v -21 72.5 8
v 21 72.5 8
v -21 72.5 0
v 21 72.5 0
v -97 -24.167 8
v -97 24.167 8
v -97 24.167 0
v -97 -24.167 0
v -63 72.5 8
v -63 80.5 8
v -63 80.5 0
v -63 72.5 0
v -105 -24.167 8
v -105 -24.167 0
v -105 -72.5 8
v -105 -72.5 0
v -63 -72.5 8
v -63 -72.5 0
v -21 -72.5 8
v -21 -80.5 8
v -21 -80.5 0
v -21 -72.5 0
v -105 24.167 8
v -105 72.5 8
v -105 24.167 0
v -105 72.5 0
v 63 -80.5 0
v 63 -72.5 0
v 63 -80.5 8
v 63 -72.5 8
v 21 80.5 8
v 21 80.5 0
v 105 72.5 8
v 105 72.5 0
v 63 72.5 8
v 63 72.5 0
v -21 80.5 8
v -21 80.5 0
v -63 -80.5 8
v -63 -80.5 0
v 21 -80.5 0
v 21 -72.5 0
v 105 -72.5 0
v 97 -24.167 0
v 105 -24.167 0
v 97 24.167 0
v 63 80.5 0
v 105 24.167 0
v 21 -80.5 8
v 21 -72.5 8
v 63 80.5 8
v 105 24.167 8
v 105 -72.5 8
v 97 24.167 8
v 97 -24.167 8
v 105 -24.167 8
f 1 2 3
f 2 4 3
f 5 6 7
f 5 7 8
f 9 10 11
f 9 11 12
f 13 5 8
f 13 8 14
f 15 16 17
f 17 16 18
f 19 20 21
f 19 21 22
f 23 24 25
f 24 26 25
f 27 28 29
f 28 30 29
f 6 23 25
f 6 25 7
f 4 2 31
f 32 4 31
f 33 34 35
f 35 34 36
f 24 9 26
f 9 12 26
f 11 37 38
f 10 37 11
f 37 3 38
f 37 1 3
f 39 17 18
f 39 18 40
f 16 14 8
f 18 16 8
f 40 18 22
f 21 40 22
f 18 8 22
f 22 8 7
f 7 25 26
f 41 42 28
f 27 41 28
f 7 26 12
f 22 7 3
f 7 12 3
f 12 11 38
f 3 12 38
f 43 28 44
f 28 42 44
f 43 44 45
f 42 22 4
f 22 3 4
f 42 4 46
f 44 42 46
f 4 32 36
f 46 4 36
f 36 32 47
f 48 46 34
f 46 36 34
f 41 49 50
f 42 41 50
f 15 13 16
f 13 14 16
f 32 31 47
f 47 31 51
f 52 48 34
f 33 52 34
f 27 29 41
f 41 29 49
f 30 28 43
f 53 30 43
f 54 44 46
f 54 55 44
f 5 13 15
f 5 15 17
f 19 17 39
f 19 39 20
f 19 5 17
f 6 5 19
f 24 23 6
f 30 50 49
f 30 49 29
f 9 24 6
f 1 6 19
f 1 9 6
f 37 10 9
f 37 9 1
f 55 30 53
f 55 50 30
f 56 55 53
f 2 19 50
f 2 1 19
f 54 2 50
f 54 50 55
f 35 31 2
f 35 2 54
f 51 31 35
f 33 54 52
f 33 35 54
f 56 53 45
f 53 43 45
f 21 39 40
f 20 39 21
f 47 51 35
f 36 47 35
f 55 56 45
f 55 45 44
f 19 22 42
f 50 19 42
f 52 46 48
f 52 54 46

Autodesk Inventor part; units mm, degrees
ref_plane "YZ Plane" through (0, 0, 0) normal (1, 0, 0) x (0, 1, 0)
ref_plane "XZ Plane" through (0, 0, 0) normal (0, 1, 0) x (-1, 0, 0)
ref_plane "XY Plane" through (0, 0, 0) normal (0, 0, 1) x (1, 0, 0)
sketch "Sketch2" plane through (0, 0, 0) normal (0, 0, 1) x (1, 0, 0)
  line L0 (-105, -72.5) -> (105, -72.5)
  line L1 (105, -72.5) -> (105, 72.5)
  line L2 (105, 72.5) -> (-105, 72.5)
  line L3 (-105, 72.5) -> (-105, -72.5)
  line L4 (-105, -72.5) -> (105, 72.5) construction
  line L5 (105, -72.5) -> (-105, 72.5) construction
  point P0 (0, 0)
  dimension "d11" = 145
  dimension "d12" = 210
extrude "Extrusion2" add sketch "Sketch2" along normal blind 8
sketch "Sketch3" plane through (0, 0, 8) normal (0, 0, 1) x (1, 0, 0)
  line L0 (105, 72.5) -> (-105, 72.5) projected
  line L1 (-63, 72.5) -> (-21, 72.5)
  line L2 (-21, 72.5) -> (-21, 80.5)
  line L3 (-21, 80.5) -> (-63, 80.5)
  line L4 (-63, 80.5) -> (-63, 72.5)
  line L5 (63, 72.5) -> (21, 72.5)
  line L6 (21, 72.5) -> (21, 80.5)
  line L7 (21, 80.5) -> (63, 80.5)
  line L8 (63, 80.5) -> (63, 72.5)
  line L9 (-21, 80.5) -> (21, 80.5) construction
  line L10 (63, 80.5) -> (105, 80.5) construction
  line L11 (-63, 80.5) -> (-105, 80.5) construction
  point P0 (0, 0)
  dimension "d15" = 8
extrude "Extrusion3" add sketch "Sketch3" against normal blind 8
mirror "Mirror1" about plane through (0, 0, 0) normal (0, 1, 0) of "Extrusion3"
sketch "Sketch4" plane through (0, 0, 8) normal (0, 0, 1) x (1, 0, 0)
  line L0 (-105, 72.5) -> (-105, -72.5) projected
  line L1 (-105, 24.1667) -> (-97, 24.1667)
  line L2 (-97, 24.1667) -> (-97, -24.1667)
  line L3 (-97, -24.1667) -> (-105, -24.1667)
  line L4 (-105, -24.1667) -> (-105, 24.1667)
  line L5 (-97, 24.1667) -> (-97, 72.5) construction
  line L6 (-97, -24.1667) -> (-97, -72.5) construction
  point P0 (0, 0)
  dimension "d20" = 8
extrude "Extrusion4" cut sketch "Sketch4" against normal blind 8
mirror "Mirror2" about plane through (0, 0, 0) normal (1, 0, 0) of "Extrusion4"
properties part number "M06 - Wall Side 1" material "Wood (Walnut)"
